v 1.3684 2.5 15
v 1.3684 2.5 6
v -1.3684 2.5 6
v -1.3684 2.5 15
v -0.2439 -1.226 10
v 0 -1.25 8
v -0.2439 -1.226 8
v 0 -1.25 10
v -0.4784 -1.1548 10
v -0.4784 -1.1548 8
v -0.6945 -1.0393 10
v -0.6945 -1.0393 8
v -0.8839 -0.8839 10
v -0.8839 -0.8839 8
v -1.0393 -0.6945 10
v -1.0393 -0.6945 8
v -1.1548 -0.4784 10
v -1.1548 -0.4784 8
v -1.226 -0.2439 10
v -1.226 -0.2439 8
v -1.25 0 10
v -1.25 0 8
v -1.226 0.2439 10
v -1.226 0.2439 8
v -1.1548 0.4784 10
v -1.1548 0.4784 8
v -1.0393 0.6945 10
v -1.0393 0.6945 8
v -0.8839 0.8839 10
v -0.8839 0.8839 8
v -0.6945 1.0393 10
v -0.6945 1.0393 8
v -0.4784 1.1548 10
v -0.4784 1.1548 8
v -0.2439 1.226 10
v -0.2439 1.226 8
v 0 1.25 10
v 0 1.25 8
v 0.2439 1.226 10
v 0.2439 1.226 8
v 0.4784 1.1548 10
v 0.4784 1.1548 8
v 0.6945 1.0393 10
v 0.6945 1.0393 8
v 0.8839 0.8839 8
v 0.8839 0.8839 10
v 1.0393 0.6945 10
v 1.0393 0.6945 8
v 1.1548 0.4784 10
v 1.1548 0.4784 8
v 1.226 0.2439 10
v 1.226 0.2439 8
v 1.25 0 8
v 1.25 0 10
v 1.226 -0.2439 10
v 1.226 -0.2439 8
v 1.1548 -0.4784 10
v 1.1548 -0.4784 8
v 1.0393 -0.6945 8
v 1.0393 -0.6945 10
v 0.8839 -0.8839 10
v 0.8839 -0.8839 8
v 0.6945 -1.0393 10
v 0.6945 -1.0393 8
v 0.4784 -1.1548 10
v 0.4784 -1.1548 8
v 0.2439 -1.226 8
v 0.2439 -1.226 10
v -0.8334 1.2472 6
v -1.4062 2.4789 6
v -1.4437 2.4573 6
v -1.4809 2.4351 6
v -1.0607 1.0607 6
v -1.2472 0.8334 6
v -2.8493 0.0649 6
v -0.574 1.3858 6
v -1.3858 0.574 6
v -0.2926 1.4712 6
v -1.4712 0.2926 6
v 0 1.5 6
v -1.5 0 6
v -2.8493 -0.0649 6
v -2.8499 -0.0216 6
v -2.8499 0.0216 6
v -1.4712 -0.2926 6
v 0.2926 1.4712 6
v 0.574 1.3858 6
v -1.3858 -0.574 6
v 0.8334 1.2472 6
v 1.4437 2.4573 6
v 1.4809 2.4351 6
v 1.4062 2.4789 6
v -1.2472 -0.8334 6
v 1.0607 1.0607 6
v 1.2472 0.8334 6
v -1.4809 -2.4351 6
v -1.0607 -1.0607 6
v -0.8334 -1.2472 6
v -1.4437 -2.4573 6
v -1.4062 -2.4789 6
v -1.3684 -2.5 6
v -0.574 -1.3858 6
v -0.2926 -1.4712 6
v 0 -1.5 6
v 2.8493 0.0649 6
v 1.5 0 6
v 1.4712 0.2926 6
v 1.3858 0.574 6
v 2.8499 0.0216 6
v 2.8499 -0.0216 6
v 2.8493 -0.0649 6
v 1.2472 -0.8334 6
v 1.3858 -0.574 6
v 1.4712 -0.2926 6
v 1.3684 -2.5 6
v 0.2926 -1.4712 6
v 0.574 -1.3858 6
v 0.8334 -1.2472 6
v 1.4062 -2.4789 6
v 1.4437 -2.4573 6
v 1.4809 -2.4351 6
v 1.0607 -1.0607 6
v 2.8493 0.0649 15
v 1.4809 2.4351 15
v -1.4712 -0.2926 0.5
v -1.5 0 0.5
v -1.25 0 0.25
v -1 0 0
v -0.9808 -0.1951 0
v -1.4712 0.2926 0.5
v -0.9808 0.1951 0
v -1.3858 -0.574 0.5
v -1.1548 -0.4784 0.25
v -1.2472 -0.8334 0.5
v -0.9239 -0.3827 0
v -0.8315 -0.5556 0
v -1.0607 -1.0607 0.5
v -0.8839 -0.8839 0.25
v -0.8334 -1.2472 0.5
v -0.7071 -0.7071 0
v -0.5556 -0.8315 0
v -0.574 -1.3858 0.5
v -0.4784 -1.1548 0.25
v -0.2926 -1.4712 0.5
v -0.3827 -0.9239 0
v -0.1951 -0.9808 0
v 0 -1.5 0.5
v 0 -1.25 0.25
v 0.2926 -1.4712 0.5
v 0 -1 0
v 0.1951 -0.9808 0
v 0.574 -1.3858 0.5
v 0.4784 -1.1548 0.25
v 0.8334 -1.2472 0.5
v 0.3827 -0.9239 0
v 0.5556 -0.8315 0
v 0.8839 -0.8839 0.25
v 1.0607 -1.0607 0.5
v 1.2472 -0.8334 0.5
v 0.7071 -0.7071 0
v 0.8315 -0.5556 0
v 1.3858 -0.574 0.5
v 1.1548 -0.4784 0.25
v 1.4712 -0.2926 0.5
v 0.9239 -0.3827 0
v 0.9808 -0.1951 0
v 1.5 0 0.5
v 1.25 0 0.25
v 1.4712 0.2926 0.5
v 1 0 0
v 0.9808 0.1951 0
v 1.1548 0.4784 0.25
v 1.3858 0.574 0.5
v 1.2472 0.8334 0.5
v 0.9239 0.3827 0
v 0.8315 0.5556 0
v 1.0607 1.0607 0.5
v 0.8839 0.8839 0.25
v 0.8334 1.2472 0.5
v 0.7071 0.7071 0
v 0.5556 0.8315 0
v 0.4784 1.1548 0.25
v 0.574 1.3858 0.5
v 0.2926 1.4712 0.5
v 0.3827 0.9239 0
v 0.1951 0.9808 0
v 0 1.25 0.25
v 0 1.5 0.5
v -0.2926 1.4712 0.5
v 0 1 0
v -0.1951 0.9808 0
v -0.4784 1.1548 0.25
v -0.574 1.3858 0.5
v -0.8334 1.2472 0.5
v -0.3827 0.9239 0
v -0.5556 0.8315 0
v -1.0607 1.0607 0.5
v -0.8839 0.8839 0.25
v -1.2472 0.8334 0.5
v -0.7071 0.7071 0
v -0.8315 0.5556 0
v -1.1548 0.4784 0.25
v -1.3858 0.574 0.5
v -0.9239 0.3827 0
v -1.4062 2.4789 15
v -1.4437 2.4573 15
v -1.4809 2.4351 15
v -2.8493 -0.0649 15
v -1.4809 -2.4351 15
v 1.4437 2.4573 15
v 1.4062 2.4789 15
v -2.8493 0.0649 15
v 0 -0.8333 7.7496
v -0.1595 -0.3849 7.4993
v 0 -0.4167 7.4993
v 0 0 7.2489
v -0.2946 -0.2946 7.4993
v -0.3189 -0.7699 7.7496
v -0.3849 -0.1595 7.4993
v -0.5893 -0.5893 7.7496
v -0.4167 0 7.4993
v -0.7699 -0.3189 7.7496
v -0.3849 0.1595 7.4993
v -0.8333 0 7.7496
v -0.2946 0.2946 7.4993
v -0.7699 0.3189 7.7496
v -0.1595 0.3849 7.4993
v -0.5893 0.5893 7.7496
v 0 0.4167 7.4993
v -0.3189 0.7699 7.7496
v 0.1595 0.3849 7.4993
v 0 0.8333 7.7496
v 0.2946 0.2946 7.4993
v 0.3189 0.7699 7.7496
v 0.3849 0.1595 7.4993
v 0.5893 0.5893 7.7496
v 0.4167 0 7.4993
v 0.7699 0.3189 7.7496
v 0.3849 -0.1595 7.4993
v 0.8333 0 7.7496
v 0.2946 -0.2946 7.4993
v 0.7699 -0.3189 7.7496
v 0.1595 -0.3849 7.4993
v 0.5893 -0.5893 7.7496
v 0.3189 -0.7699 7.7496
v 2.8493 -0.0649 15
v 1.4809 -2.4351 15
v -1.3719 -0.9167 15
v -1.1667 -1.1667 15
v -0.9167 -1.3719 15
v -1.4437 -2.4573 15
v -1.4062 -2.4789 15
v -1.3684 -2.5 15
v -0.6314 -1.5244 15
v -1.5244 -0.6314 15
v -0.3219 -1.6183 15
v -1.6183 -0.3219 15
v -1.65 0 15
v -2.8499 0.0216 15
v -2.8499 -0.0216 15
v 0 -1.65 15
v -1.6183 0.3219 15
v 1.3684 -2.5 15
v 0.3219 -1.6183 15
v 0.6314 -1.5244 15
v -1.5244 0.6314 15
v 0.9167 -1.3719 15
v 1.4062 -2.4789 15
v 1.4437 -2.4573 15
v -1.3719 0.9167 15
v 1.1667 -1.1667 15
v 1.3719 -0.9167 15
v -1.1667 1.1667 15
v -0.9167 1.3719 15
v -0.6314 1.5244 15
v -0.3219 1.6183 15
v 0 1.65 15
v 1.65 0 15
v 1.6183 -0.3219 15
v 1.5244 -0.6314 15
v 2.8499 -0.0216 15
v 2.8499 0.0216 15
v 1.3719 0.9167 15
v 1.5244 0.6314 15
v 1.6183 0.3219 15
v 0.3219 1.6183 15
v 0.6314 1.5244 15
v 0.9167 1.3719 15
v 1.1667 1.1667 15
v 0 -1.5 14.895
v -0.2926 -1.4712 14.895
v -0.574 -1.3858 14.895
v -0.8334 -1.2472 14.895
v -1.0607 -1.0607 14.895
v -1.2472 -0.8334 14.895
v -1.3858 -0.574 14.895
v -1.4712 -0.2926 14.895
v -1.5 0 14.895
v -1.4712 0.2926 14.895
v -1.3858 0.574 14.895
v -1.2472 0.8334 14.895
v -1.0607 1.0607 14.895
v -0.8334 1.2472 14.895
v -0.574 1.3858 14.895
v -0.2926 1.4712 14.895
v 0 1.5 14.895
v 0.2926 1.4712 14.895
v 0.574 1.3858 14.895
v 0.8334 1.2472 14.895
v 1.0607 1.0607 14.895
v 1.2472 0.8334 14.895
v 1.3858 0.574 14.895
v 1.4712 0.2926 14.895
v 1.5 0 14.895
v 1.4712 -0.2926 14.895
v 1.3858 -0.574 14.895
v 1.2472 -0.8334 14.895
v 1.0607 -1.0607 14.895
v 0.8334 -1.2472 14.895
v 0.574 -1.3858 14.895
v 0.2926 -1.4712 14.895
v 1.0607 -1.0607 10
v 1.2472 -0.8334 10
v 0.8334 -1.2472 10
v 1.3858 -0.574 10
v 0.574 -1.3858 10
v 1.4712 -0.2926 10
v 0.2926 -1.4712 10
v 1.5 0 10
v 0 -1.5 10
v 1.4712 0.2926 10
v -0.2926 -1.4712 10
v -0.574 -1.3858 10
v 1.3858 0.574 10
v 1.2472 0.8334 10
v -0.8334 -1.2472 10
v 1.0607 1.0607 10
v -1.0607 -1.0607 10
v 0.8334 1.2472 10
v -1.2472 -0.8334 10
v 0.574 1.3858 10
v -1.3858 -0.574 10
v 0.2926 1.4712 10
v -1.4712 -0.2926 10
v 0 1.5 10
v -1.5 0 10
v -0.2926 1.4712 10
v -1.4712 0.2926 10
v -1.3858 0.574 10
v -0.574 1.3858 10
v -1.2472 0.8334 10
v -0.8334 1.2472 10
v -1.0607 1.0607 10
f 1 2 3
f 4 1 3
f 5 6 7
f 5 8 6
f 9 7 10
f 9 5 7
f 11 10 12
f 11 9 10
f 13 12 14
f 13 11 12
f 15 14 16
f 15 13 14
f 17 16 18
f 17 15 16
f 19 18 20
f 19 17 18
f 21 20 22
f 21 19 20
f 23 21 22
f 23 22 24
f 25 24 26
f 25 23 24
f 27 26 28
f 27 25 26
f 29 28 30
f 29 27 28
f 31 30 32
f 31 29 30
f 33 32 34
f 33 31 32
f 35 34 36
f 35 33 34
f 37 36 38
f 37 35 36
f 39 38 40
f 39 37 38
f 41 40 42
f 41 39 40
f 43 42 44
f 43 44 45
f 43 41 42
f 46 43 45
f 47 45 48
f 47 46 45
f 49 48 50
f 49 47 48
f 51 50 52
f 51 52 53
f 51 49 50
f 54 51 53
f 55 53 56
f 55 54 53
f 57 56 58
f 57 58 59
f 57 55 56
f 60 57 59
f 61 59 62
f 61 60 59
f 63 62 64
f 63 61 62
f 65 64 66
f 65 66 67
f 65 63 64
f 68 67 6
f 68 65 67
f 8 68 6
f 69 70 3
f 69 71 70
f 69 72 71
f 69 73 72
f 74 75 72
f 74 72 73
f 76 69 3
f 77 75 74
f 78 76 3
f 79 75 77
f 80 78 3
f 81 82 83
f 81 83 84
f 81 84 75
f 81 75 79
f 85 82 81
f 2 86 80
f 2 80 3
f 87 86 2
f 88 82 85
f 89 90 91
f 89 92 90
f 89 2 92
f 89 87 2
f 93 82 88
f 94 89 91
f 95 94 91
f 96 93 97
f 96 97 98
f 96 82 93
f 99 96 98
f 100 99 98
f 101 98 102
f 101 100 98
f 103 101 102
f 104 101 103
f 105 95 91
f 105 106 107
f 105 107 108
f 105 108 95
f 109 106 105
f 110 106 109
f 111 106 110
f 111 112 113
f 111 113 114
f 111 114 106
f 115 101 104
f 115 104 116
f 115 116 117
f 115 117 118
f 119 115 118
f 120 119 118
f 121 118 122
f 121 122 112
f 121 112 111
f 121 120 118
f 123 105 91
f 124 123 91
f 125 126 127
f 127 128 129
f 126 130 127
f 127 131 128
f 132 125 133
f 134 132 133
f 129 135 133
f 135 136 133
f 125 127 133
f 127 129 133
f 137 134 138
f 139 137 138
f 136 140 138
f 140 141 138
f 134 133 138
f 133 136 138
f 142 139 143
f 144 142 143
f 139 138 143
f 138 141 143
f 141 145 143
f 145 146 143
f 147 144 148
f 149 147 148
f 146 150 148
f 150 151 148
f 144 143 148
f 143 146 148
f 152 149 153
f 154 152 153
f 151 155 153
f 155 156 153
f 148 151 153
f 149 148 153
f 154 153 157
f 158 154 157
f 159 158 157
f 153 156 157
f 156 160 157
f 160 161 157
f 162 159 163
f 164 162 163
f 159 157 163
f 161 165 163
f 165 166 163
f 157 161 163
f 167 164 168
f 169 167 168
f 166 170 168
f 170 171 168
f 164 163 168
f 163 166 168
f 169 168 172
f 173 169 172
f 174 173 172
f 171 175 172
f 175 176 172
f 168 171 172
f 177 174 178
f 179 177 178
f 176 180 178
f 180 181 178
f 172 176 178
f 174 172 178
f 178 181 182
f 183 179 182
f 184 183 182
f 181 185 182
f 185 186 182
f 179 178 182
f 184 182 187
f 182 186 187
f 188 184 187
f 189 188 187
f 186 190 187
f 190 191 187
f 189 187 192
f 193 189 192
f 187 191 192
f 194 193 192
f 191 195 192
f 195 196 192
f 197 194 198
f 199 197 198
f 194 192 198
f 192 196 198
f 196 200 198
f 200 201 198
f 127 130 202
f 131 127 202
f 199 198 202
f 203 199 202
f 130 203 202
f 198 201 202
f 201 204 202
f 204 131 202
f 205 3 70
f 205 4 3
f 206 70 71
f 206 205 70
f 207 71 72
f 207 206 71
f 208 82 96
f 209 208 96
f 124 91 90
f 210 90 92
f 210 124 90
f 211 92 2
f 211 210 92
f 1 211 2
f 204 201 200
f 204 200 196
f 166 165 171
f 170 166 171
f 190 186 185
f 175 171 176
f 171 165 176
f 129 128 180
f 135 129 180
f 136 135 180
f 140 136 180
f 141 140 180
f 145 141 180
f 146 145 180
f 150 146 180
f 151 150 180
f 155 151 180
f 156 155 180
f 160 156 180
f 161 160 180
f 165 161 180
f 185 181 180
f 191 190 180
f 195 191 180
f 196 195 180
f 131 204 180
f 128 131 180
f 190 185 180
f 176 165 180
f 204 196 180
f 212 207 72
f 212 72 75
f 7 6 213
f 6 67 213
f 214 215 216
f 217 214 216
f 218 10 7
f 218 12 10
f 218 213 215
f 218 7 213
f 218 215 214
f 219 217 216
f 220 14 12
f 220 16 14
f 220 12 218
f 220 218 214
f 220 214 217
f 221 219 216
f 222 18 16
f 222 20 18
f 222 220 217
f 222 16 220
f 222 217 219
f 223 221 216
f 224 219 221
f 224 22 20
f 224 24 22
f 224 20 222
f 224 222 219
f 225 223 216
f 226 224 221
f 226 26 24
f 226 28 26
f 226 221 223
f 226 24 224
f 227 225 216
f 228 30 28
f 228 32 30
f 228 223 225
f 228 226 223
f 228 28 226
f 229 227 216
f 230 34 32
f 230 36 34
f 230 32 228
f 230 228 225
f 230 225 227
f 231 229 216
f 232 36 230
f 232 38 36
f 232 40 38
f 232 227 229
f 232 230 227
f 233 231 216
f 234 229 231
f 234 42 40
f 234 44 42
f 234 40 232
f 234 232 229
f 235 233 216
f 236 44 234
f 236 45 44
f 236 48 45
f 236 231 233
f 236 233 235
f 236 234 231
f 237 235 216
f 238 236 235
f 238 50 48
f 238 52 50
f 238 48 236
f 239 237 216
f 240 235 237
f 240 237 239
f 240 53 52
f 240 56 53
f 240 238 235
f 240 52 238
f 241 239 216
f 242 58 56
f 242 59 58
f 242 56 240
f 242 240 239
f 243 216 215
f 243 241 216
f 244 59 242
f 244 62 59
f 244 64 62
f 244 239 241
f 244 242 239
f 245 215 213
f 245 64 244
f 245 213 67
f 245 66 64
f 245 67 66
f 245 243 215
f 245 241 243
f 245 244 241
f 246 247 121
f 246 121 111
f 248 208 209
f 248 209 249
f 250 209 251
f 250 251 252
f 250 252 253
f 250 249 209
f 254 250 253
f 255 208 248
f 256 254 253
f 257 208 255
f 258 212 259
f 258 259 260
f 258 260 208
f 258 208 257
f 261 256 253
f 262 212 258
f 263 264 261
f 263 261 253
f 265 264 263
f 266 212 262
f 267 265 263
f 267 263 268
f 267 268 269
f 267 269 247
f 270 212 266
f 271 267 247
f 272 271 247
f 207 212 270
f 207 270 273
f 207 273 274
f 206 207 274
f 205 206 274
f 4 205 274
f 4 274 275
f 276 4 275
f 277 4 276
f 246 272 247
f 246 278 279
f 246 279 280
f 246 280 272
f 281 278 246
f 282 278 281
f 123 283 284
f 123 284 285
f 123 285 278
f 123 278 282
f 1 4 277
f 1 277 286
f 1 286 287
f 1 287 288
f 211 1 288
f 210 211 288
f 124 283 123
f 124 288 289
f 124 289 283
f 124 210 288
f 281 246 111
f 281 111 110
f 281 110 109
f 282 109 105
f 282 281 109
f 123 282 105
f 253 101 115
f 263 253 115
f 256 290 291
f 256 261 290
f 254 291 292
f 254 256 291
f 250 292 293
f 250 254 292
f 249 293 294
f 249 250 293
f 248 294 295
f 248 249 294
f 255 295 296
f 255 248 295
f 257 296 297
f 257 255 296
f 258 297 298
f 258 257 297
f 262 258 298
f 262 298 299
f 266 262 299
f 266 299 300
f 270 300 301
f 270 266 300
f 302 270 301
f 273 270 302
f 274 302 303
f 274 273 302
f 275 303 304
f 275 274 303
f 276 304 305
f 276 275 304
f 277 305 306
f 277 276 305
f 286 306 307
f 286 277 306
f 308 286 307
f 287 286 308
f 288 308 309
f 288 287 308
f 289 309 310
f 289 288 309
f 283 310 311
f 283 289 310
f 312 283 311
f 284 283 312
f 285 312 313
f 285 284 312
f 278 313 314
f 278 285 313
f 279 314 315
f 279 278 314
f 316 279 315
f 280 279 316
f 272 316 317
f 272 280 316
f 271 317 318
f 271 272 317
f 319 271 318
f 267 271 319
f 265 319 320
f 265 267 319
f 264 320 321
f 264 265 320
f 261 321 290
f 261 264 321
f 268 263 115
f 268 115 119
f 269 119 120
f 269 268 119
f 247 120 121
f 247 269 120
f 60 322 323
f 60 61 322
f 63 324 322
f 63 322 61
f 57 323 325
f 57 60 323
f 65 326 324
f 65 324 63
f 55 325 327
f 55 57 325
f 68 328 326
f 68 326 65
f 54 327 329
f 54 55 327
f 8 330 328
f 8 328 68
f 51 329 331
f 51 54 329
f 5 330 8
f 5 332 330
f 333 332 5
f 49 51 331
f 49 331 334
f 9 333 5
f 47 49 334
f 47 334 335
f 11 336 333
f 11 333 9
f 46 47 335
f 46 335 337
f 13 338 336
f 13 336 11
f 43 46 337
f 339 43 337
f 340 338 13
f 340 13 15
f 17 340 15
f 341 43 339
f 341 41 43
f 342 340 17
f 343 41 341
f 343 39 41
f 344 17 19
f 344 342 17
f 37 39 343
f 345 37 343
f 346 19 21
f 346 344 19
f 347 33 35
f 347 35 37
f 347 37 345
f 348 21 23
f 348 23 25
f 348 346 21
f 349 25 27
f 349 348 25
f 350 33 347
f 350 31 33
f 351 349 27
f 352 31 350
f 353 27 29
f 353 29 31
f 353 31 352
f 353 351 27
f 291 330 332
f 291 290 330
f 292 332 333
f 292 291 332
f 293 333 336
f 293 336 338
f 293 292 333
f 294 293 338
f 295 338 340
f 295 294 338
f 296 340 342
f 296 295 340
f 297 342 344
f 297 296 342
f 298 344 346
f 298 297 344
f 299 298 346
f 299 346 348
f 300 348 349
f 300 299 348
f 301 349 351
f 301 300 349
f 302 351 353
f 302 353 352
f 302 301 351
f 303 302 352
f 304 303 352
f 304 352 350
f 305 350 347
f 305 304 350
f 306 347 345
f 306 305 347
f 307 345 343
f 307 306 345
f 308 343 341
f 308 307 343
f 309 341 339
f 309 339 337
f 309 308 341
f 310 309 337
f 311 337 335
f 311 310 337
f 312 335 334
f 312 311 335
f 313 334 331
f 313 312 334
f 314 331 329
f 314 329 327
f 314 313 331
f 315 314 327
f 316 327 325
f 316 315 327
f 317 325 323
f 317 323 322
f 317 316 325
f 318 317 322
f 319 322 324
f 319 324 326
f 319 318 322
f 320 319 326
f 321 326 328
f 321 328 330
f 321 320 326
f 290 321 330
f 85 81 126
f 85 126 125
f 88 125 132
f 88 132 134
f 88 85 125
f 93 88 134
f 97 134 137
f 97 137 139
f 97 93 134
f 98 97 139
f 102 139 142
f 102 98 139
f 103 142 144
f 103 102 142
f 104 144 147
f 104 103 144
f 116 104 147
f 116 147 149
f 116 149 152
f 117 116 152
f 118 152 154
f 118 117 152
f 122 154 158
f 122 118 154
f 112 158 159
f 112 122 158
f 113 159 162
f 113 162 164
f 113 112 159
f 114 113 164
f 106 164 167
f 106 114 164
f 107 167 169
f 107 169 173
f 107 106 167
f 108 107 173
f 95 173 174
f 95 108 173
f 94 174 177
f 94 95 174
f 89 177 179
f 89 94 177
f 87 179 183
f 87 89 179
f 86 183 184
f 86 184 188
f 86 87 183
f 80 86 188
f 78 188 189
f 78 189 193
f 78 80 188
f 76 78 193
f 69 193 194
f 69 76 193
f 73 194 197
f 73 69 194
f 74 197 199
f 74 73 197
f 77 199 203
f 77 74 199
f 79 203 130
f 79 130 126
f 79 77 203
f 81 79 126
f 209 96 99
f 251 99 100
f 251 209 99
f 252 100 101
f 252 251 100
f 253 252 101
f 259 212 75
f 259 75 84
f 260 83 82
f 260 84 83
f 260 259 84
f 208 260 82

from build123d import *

# Parameters (mm, degrees)
EXTRUDE_1_DEPTH = 15
CHAMFER_1_SIZE  = 0.5


with BuildPart() as part:
    # Эскиз1 → Бобышка-Вытянуть1 (new body)
    with BuildSketch(Plane.XY):
        Polygon((2.886751346, 0), (1.443375673, 2.5), (-1.443375673, 2.5), (-2.886751346, 0), (-1.443375673, -2.5), (1.443375673, -2.5), align=None)
    extrude(amount=EXTRUDE_1_DEPTH)

    # Эскиз3 → Вырез-Повернуть1 (revolve, cut)
    with BuildSketch(Plane(origin=(0, 0, 0), x_dir=(1, 0, 0), z_dir=(0, 1, 0))):
        Polygon((-2.886751346, 0), (-1.5, 0), (-1.5, -6), (-2.85, -6), (-2.85, -15), (-2.886751346, -15), align=None)
    revolve(axis=Axis((0, 0, 0), (0, 0, 1)), mode=Mode.SUBTRACT)

    # Фаска1
    chamfer_1_edges = [part.edges().sort_by_distance(p)[0] for p in [
        (1.5, 0, 0),
    ]]
    chamfer(chamfer_1_edges, length=CHAMFER_1_SIZE)

    # Эскиз4 → Отверстие обработанное метчиком M31 (revolve, cut)
    with BuildSketch(Plane(origin=(0, 0, 15), x_dir=(0, -1, 0), z_dir=(1, 0, 0))):
        Polygon((0, 0), (0, 7.751075774), (1.25, 7), (1.25, 5), (1.5, 5), (1.5, 0.105031131), (1.65, 0), align=None)
    revolve(axis=Axis((0, 0, 21.35), (0, 0, -1)), mode=Mode.SUBTRACT)


solid = part.part
